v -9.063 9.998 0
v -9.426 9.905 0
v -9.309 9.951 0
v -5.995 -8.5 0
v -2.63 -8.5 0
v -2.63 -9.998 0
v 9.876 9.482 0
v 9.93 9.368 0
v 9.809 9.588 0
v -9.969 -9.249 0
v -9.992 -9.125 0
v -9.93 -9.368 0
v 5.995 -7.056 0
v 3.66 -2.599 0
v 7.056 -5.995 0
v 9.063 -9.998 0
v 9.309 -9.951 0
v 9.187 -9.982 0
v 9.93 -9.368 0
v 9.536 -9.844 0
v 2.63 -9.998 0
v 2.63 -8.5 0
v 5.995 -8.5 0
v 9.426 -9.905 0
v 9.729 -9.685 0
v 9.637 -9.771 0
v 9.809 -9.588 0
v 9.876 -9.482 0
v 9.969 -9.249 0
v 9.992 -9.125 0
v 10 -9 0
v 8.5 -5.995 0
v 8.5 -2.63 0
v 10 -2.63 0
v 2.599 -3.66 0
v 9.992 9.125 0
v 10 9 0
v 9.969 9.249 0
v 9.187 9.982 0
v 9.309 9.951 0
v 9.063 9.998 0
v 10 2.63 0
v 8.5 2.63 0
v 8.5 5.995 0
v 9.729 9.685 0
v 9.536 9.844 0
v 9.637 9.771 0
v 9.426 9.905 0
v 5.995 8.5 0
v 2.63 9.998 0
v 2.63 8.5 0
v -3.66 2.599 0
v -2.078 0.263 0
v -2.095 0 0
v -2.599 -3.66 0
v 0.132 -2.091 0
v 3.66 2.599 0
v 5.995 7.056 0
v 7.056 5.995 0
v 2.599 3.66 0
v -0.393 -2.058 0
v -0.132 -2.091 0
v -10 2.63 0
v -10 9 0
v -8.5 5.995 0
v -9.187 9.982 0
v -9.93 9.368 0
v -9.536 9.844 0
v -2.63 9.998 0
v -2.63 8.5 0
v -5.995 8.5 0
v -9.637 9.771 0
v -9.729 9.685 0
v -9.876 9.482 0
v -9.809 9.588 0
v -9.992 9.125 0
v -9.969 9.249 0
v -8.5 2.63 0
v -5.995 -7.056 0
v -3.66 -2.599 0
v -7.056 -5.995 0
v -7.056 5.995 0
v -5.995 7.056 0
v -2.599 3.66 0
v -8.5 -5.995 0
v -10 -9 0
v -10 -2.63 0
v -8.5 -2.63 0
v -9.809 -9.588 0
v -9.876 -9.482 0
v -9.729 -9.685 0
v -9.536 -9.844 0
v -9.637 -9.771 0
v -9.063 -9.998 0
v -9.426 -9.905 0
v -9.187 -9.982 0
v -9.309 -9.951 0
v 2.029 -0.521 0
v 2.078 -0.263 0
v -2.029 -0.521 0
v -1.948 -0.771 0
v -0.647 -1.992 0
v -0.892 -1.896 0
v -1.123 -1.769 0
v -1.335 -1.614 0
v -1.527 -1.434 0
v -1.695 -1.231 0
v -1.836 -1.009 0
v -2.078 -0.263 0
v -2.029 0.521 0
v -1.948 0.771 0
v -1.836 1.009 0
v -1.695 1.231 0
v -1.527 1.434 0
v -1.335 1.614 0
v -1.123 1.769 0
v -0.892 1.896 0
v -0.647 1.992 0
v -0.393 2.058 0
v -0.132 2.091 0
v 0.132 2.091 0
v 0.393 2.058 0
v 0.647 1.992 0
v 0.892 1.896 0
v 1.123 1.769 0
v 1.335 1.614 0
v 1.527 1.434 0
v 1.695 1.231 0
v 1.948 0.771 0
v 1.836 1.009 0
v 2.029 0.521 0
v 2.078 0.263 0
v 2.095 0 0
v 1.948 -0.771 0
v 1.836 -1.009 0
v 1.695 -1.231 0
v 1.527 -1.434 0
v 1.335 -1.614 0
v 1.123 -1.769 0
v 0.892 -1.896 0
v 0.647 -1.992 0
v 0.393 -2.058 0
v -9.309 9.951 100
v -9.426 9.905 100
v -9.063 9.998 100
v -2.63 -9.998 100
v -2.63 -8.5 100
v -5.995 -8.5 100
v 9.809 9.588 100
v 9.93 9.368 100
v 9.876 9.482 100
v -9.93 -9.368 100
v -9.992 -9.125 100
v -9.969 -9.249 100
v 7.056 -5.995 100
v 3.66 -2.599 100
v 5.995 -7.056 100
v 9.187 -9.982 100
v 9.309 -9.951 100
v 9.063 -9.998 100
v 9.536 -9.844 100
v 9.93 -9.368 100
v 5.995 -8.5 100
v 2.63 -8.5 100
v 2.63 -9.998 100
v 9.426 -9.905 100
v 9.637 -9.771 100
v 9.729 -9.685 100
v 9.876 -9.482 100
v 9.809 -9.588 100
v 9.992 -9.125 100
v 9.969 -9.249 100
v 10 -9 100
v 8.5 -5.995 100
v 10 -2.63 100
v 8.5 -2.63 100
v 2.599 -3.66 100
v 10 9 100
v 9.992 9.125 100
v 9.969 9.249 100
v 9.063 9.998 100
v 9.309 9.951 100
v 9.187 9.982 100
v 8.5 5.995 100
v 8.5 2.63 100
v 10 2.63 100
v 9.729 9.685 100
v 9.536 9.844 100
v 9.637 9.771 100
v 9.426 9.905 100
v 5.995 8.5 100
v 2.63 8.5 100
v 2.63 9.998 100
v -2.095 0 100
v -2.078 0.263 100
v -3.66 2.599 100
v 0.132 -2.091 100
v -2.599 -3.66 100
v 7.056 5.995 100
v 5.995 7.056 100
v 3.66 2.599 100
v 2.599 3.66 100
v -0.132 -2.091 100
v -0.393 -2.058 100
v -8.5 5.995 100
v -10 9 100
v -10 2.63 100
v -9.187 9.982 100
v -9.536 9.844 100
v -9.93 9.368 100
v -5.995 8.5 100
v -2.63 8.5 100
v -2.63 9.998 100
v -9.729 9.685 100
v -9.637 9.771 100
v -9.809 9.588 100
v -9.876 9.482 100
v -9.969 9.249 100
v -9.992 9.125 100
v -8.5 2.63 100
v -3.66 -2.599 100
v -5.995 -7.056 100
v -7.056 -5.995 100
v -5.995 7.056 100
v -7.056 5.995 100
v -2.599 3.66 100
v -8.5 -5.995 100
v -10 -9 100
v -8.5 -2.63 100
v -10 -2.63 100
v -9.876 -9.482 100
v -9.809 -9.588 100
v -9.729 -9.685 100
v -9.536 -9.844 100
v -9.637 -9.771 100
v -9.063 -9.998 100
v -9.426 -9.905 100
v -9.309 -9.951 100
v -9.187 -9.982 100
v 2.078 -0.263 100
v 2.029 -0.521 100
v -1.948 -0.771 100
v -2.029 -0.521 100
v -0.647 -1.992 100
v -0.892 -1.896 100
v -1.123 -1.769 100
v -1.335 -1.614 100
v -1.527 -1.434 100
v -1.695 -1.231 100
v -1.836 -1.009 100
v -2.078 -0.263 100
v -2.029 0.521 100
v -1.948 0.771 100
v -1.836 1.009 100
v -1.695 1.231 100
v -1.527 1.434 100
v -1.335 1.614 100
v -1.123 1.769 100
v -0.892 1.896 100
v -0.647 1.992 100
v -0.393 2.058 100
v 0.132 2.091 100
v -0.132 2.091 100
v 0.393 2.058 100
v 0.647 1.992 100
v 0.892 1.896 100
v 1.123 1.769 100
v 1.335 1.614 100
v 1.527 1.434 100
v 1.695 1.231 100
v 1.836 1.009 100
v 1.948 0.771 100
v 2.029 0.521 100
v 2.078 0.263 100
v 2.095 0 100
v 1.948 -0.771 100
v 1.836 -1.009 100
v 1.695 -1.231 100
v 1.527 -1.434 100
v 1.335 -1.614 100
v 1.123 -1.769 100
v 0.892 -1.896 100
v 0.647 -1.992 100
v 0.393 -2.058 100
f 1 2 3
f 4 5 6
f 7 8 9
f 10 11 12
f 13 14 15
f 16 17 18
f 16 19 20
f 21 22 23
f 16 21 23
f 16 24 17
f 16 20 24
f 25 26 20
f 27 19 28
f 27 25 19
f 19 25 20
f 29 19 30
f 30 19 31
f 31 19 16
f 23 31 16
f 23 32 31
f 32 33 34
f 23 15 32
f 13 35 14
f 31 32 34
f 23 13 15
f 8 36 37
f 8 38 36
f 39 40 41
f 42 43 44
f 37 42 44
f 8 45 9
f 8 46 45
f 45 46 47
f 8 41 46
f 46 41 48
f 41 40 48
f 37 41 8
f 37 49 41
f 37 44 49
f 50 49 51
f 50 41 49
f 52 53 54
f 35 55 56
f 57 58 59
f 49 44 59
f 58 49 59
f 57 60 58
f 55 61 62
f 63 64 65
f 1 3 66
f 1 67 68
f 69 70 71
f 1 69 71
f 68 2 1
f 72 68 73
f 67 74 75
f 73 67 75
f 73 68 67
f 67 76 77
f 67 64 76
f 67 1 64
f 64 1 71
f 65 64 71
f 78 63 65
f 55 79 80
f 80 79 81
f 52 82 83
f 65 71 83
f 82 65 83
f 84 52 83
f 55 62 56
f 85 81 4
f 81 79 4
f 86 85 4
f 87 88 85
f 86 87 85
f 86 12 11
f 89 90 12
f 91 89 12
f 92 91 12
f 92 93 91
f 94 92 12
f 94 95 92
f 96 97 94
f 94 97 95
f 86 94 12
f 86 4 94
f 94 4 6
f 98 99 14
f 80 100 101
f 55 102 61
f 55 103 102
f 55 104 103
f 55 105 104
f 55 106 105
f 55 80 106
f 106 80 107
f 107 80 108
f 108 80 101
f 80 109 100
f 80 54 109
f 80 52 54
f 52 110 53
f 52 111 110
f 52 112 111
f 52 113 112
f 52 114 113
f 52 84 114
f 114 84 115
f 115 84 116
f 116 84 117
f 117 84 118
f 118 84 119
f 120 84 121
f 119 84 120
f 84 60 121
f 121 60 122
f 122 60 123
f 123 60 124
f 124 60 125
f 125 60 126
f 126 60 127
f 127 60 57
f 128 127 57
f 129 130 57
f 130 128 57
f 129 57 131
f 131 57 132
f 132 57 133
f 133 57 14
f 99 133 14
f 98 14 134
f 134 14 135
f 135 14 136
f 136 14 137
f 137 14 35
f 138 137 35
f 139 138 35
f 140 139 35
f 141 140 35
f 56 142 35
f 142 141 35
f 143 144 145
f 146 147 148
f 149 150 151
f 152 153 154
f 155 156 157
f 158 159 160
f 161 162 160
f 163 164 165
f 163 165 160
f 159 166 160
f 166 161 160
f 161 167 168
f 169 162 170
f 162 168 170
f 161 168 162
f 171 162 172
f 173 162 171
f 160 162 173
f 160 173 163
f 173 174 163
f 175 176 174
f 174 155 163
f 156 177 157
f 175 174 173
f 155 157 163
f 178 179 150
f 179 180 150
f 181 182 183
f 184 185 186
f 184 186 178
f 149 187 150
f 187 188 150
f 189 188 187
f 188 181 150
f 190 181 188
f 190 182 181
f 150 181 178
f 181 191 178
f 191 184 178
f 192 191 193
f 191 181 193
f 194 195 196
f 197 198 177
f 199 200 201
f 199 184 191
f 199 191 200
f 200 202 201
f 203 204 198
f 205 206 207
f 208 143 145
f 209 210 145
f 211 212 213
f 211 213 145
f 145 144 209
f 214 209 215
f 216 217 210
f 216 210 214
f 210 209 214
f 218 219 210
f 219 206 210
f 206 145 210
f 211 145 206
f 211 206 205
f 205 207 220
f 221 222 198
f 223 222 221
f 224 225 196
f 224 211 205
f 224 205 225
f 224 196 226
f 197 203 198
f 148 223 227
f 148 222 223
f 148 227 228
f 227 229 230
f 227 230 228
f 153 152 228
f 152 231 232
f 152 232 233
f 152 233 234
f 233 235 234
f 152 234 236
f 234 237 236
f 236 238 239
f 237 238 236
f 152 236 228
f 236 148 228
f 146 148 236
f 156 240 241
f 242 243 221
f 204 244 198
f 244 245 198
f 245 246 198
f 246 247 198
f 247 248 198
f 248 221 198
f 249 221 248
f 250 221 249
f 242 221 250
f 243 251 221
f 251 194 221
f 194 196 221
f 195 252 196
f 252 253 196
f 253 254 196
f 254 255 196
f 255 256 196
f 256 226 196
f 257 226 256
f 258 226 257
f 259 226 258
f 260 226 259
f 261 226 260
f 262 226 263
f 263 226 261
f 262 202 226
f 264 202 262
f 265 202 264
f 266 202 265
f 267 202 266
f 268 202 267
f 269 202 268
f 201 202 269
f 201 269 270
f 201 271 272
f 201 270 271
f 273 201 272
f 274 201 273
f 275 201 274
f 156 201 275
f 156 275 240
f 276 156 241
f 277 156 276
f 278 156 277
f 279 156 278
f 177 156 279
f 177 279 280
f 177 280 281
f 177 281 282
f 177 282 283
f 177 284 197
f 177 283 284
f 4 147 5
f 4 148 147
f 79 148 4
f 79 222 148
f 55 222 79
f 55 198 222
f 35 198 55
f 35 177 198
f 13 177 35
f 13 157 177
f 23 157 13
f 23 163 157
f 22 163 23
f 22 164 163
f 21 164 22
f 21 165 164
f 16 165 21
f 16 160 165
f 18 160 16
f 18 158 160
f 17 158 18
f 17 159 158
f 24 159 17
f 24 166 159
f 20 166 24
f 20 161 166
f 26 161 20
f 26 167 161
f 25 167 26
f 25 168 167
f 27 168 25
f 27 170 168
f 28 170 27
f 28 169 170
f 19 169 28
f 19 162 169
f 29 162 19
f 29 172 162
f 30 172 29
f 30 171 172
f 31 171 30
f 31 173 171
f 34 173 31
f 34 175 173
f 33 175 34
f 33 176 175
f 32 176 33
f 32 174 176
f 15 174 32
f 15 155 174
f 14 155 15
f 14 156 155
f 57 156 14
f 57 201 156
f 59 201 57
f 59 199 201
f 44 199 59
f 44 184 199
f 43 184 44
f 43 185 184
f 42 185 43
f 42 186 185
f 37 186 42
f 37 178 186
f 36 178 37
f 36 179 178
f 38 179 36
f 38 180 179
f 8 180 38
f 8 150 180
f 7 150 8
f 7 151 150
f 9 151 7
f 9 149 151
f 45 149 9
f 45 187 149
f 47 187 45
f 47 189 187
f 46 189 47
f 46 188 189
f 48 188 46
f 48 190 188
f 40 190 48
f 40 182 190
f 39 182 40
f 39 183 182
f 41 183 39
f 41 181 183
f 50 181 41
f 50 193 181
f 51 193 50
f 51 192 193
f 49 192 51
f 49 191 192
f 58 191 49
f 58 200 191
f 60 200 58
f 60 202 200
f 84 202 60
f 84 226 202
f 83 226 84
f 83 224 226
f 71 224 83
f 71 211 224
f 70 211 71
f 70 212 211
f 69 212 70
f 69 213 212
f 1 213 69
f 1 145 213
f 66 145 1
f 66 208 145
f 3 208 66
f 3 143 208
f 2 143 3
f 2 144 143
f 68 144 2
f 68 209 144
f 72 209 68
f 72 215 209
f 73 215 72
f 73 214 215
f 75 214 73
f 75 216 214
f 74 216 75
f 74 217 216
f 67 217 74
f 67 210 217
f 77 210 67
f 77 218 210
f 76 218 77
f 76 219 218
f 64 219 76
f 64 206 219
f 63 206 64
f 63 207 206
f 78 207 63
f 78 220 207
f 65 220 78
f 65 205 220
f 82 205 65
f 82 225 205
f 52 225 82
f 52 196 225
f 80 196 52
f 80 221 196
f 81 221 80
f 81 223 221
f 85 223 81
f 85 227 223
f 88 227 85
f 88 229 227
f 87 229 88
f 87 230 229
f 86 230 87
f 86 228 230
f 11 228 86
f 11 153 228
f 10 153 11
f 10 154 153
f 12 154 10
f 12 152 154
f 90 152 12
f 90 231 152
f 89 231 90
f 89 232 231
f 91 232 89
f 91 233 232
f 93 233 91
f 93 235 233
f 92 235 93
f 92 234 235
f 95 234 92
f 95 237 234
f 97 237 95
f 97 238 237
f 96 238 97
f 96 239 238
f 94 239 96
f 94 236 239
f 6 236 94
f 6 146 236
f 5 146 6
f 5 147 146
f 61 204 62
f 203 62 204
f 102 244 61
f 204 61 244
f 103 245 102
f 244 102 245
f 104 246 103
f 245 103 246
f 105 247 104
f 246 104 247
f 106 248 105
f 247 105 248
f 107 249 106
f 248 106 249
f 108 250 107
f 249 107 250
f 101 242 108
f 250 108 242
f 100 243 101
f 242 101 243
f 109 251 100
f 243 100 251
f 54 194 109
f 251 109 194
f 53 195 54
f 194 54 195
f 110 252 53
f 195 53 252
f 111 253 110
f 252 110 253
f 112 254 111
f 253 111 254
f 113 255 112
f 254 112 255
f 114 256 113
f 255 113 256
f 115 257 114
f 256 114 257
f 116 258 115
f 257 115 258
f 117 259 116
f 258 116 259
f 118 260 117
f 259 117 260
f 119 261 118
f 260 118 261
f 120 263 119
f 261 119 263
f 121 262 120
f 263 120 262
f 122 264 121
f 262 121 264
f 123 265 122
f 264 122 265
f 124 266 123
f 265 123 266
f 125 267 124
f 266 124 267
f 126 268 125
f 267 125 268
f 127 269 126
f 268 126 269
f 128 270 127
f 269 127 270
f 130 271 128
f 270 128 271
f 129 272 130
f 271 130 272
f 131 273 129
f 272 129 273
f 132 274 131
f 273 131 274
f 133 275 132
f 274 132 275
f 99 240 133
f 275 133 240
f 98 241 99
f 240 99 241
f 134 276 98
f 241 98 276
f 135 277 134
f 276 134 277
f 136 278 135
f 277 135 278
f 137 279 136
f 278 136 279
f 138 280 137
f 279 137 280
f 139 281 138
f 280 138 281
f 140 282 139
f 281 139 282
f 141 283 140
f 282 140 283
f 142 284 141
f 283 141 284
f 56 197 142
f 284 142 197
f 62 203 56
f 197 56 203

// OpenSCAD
length=100;

tslot20(length);

module tslot20(length) {
    $fn=50;
    height=20; 
    inner_size=7.32;
    diag_width=1.5;
    gap=5.26;
    inner_depth=6.8;
    full_depth=9.18;
    through_rad=4.19/2;
    inside_gap=11.99;
    edge_thickness=1.5;
    
    module outer_edge() {
        intersection() {
            difference() {
                union() {
                    difference() {
                            square(size=height, center=true);    
                            
                        square(size=(height-edge_thickness*2), center=true);            
                        for(rot = [0:90:270]) {
                            rotate([0,0,rot]) 
                            translate([0,height/2,0])
                            square([gap,10],true);
                        }
                    }
                    corner_boxes();            
                    diag_beams();
                }
            }    
            minkowski() {
                            square(size=height-2, center=true);    
                            circle(r=1);
                        }
        }
    }

    module corner_boxes() {
        for(rot=[0:90:270]) {
            rotate([0,0,rot])
            translate([-height/2,-height/2,0])        
            square(size=(height-inside_gap)/2);
        }    
    }

    module inner_section() {
        difference() {
            square(size=inner_size,center=true);
            circle(through_rad);
        }
    }

    module diag_beams() {
        for(rot = [45:90:90*3+45]) {
            rotate([0,0,rot]) 
            translate([-diag_width/2,4,0])
            square([diag_width,13
            ], false);
        }
    }

    linear_extrude(length) {
        outer_edge();
        inner_section();
    }

}
